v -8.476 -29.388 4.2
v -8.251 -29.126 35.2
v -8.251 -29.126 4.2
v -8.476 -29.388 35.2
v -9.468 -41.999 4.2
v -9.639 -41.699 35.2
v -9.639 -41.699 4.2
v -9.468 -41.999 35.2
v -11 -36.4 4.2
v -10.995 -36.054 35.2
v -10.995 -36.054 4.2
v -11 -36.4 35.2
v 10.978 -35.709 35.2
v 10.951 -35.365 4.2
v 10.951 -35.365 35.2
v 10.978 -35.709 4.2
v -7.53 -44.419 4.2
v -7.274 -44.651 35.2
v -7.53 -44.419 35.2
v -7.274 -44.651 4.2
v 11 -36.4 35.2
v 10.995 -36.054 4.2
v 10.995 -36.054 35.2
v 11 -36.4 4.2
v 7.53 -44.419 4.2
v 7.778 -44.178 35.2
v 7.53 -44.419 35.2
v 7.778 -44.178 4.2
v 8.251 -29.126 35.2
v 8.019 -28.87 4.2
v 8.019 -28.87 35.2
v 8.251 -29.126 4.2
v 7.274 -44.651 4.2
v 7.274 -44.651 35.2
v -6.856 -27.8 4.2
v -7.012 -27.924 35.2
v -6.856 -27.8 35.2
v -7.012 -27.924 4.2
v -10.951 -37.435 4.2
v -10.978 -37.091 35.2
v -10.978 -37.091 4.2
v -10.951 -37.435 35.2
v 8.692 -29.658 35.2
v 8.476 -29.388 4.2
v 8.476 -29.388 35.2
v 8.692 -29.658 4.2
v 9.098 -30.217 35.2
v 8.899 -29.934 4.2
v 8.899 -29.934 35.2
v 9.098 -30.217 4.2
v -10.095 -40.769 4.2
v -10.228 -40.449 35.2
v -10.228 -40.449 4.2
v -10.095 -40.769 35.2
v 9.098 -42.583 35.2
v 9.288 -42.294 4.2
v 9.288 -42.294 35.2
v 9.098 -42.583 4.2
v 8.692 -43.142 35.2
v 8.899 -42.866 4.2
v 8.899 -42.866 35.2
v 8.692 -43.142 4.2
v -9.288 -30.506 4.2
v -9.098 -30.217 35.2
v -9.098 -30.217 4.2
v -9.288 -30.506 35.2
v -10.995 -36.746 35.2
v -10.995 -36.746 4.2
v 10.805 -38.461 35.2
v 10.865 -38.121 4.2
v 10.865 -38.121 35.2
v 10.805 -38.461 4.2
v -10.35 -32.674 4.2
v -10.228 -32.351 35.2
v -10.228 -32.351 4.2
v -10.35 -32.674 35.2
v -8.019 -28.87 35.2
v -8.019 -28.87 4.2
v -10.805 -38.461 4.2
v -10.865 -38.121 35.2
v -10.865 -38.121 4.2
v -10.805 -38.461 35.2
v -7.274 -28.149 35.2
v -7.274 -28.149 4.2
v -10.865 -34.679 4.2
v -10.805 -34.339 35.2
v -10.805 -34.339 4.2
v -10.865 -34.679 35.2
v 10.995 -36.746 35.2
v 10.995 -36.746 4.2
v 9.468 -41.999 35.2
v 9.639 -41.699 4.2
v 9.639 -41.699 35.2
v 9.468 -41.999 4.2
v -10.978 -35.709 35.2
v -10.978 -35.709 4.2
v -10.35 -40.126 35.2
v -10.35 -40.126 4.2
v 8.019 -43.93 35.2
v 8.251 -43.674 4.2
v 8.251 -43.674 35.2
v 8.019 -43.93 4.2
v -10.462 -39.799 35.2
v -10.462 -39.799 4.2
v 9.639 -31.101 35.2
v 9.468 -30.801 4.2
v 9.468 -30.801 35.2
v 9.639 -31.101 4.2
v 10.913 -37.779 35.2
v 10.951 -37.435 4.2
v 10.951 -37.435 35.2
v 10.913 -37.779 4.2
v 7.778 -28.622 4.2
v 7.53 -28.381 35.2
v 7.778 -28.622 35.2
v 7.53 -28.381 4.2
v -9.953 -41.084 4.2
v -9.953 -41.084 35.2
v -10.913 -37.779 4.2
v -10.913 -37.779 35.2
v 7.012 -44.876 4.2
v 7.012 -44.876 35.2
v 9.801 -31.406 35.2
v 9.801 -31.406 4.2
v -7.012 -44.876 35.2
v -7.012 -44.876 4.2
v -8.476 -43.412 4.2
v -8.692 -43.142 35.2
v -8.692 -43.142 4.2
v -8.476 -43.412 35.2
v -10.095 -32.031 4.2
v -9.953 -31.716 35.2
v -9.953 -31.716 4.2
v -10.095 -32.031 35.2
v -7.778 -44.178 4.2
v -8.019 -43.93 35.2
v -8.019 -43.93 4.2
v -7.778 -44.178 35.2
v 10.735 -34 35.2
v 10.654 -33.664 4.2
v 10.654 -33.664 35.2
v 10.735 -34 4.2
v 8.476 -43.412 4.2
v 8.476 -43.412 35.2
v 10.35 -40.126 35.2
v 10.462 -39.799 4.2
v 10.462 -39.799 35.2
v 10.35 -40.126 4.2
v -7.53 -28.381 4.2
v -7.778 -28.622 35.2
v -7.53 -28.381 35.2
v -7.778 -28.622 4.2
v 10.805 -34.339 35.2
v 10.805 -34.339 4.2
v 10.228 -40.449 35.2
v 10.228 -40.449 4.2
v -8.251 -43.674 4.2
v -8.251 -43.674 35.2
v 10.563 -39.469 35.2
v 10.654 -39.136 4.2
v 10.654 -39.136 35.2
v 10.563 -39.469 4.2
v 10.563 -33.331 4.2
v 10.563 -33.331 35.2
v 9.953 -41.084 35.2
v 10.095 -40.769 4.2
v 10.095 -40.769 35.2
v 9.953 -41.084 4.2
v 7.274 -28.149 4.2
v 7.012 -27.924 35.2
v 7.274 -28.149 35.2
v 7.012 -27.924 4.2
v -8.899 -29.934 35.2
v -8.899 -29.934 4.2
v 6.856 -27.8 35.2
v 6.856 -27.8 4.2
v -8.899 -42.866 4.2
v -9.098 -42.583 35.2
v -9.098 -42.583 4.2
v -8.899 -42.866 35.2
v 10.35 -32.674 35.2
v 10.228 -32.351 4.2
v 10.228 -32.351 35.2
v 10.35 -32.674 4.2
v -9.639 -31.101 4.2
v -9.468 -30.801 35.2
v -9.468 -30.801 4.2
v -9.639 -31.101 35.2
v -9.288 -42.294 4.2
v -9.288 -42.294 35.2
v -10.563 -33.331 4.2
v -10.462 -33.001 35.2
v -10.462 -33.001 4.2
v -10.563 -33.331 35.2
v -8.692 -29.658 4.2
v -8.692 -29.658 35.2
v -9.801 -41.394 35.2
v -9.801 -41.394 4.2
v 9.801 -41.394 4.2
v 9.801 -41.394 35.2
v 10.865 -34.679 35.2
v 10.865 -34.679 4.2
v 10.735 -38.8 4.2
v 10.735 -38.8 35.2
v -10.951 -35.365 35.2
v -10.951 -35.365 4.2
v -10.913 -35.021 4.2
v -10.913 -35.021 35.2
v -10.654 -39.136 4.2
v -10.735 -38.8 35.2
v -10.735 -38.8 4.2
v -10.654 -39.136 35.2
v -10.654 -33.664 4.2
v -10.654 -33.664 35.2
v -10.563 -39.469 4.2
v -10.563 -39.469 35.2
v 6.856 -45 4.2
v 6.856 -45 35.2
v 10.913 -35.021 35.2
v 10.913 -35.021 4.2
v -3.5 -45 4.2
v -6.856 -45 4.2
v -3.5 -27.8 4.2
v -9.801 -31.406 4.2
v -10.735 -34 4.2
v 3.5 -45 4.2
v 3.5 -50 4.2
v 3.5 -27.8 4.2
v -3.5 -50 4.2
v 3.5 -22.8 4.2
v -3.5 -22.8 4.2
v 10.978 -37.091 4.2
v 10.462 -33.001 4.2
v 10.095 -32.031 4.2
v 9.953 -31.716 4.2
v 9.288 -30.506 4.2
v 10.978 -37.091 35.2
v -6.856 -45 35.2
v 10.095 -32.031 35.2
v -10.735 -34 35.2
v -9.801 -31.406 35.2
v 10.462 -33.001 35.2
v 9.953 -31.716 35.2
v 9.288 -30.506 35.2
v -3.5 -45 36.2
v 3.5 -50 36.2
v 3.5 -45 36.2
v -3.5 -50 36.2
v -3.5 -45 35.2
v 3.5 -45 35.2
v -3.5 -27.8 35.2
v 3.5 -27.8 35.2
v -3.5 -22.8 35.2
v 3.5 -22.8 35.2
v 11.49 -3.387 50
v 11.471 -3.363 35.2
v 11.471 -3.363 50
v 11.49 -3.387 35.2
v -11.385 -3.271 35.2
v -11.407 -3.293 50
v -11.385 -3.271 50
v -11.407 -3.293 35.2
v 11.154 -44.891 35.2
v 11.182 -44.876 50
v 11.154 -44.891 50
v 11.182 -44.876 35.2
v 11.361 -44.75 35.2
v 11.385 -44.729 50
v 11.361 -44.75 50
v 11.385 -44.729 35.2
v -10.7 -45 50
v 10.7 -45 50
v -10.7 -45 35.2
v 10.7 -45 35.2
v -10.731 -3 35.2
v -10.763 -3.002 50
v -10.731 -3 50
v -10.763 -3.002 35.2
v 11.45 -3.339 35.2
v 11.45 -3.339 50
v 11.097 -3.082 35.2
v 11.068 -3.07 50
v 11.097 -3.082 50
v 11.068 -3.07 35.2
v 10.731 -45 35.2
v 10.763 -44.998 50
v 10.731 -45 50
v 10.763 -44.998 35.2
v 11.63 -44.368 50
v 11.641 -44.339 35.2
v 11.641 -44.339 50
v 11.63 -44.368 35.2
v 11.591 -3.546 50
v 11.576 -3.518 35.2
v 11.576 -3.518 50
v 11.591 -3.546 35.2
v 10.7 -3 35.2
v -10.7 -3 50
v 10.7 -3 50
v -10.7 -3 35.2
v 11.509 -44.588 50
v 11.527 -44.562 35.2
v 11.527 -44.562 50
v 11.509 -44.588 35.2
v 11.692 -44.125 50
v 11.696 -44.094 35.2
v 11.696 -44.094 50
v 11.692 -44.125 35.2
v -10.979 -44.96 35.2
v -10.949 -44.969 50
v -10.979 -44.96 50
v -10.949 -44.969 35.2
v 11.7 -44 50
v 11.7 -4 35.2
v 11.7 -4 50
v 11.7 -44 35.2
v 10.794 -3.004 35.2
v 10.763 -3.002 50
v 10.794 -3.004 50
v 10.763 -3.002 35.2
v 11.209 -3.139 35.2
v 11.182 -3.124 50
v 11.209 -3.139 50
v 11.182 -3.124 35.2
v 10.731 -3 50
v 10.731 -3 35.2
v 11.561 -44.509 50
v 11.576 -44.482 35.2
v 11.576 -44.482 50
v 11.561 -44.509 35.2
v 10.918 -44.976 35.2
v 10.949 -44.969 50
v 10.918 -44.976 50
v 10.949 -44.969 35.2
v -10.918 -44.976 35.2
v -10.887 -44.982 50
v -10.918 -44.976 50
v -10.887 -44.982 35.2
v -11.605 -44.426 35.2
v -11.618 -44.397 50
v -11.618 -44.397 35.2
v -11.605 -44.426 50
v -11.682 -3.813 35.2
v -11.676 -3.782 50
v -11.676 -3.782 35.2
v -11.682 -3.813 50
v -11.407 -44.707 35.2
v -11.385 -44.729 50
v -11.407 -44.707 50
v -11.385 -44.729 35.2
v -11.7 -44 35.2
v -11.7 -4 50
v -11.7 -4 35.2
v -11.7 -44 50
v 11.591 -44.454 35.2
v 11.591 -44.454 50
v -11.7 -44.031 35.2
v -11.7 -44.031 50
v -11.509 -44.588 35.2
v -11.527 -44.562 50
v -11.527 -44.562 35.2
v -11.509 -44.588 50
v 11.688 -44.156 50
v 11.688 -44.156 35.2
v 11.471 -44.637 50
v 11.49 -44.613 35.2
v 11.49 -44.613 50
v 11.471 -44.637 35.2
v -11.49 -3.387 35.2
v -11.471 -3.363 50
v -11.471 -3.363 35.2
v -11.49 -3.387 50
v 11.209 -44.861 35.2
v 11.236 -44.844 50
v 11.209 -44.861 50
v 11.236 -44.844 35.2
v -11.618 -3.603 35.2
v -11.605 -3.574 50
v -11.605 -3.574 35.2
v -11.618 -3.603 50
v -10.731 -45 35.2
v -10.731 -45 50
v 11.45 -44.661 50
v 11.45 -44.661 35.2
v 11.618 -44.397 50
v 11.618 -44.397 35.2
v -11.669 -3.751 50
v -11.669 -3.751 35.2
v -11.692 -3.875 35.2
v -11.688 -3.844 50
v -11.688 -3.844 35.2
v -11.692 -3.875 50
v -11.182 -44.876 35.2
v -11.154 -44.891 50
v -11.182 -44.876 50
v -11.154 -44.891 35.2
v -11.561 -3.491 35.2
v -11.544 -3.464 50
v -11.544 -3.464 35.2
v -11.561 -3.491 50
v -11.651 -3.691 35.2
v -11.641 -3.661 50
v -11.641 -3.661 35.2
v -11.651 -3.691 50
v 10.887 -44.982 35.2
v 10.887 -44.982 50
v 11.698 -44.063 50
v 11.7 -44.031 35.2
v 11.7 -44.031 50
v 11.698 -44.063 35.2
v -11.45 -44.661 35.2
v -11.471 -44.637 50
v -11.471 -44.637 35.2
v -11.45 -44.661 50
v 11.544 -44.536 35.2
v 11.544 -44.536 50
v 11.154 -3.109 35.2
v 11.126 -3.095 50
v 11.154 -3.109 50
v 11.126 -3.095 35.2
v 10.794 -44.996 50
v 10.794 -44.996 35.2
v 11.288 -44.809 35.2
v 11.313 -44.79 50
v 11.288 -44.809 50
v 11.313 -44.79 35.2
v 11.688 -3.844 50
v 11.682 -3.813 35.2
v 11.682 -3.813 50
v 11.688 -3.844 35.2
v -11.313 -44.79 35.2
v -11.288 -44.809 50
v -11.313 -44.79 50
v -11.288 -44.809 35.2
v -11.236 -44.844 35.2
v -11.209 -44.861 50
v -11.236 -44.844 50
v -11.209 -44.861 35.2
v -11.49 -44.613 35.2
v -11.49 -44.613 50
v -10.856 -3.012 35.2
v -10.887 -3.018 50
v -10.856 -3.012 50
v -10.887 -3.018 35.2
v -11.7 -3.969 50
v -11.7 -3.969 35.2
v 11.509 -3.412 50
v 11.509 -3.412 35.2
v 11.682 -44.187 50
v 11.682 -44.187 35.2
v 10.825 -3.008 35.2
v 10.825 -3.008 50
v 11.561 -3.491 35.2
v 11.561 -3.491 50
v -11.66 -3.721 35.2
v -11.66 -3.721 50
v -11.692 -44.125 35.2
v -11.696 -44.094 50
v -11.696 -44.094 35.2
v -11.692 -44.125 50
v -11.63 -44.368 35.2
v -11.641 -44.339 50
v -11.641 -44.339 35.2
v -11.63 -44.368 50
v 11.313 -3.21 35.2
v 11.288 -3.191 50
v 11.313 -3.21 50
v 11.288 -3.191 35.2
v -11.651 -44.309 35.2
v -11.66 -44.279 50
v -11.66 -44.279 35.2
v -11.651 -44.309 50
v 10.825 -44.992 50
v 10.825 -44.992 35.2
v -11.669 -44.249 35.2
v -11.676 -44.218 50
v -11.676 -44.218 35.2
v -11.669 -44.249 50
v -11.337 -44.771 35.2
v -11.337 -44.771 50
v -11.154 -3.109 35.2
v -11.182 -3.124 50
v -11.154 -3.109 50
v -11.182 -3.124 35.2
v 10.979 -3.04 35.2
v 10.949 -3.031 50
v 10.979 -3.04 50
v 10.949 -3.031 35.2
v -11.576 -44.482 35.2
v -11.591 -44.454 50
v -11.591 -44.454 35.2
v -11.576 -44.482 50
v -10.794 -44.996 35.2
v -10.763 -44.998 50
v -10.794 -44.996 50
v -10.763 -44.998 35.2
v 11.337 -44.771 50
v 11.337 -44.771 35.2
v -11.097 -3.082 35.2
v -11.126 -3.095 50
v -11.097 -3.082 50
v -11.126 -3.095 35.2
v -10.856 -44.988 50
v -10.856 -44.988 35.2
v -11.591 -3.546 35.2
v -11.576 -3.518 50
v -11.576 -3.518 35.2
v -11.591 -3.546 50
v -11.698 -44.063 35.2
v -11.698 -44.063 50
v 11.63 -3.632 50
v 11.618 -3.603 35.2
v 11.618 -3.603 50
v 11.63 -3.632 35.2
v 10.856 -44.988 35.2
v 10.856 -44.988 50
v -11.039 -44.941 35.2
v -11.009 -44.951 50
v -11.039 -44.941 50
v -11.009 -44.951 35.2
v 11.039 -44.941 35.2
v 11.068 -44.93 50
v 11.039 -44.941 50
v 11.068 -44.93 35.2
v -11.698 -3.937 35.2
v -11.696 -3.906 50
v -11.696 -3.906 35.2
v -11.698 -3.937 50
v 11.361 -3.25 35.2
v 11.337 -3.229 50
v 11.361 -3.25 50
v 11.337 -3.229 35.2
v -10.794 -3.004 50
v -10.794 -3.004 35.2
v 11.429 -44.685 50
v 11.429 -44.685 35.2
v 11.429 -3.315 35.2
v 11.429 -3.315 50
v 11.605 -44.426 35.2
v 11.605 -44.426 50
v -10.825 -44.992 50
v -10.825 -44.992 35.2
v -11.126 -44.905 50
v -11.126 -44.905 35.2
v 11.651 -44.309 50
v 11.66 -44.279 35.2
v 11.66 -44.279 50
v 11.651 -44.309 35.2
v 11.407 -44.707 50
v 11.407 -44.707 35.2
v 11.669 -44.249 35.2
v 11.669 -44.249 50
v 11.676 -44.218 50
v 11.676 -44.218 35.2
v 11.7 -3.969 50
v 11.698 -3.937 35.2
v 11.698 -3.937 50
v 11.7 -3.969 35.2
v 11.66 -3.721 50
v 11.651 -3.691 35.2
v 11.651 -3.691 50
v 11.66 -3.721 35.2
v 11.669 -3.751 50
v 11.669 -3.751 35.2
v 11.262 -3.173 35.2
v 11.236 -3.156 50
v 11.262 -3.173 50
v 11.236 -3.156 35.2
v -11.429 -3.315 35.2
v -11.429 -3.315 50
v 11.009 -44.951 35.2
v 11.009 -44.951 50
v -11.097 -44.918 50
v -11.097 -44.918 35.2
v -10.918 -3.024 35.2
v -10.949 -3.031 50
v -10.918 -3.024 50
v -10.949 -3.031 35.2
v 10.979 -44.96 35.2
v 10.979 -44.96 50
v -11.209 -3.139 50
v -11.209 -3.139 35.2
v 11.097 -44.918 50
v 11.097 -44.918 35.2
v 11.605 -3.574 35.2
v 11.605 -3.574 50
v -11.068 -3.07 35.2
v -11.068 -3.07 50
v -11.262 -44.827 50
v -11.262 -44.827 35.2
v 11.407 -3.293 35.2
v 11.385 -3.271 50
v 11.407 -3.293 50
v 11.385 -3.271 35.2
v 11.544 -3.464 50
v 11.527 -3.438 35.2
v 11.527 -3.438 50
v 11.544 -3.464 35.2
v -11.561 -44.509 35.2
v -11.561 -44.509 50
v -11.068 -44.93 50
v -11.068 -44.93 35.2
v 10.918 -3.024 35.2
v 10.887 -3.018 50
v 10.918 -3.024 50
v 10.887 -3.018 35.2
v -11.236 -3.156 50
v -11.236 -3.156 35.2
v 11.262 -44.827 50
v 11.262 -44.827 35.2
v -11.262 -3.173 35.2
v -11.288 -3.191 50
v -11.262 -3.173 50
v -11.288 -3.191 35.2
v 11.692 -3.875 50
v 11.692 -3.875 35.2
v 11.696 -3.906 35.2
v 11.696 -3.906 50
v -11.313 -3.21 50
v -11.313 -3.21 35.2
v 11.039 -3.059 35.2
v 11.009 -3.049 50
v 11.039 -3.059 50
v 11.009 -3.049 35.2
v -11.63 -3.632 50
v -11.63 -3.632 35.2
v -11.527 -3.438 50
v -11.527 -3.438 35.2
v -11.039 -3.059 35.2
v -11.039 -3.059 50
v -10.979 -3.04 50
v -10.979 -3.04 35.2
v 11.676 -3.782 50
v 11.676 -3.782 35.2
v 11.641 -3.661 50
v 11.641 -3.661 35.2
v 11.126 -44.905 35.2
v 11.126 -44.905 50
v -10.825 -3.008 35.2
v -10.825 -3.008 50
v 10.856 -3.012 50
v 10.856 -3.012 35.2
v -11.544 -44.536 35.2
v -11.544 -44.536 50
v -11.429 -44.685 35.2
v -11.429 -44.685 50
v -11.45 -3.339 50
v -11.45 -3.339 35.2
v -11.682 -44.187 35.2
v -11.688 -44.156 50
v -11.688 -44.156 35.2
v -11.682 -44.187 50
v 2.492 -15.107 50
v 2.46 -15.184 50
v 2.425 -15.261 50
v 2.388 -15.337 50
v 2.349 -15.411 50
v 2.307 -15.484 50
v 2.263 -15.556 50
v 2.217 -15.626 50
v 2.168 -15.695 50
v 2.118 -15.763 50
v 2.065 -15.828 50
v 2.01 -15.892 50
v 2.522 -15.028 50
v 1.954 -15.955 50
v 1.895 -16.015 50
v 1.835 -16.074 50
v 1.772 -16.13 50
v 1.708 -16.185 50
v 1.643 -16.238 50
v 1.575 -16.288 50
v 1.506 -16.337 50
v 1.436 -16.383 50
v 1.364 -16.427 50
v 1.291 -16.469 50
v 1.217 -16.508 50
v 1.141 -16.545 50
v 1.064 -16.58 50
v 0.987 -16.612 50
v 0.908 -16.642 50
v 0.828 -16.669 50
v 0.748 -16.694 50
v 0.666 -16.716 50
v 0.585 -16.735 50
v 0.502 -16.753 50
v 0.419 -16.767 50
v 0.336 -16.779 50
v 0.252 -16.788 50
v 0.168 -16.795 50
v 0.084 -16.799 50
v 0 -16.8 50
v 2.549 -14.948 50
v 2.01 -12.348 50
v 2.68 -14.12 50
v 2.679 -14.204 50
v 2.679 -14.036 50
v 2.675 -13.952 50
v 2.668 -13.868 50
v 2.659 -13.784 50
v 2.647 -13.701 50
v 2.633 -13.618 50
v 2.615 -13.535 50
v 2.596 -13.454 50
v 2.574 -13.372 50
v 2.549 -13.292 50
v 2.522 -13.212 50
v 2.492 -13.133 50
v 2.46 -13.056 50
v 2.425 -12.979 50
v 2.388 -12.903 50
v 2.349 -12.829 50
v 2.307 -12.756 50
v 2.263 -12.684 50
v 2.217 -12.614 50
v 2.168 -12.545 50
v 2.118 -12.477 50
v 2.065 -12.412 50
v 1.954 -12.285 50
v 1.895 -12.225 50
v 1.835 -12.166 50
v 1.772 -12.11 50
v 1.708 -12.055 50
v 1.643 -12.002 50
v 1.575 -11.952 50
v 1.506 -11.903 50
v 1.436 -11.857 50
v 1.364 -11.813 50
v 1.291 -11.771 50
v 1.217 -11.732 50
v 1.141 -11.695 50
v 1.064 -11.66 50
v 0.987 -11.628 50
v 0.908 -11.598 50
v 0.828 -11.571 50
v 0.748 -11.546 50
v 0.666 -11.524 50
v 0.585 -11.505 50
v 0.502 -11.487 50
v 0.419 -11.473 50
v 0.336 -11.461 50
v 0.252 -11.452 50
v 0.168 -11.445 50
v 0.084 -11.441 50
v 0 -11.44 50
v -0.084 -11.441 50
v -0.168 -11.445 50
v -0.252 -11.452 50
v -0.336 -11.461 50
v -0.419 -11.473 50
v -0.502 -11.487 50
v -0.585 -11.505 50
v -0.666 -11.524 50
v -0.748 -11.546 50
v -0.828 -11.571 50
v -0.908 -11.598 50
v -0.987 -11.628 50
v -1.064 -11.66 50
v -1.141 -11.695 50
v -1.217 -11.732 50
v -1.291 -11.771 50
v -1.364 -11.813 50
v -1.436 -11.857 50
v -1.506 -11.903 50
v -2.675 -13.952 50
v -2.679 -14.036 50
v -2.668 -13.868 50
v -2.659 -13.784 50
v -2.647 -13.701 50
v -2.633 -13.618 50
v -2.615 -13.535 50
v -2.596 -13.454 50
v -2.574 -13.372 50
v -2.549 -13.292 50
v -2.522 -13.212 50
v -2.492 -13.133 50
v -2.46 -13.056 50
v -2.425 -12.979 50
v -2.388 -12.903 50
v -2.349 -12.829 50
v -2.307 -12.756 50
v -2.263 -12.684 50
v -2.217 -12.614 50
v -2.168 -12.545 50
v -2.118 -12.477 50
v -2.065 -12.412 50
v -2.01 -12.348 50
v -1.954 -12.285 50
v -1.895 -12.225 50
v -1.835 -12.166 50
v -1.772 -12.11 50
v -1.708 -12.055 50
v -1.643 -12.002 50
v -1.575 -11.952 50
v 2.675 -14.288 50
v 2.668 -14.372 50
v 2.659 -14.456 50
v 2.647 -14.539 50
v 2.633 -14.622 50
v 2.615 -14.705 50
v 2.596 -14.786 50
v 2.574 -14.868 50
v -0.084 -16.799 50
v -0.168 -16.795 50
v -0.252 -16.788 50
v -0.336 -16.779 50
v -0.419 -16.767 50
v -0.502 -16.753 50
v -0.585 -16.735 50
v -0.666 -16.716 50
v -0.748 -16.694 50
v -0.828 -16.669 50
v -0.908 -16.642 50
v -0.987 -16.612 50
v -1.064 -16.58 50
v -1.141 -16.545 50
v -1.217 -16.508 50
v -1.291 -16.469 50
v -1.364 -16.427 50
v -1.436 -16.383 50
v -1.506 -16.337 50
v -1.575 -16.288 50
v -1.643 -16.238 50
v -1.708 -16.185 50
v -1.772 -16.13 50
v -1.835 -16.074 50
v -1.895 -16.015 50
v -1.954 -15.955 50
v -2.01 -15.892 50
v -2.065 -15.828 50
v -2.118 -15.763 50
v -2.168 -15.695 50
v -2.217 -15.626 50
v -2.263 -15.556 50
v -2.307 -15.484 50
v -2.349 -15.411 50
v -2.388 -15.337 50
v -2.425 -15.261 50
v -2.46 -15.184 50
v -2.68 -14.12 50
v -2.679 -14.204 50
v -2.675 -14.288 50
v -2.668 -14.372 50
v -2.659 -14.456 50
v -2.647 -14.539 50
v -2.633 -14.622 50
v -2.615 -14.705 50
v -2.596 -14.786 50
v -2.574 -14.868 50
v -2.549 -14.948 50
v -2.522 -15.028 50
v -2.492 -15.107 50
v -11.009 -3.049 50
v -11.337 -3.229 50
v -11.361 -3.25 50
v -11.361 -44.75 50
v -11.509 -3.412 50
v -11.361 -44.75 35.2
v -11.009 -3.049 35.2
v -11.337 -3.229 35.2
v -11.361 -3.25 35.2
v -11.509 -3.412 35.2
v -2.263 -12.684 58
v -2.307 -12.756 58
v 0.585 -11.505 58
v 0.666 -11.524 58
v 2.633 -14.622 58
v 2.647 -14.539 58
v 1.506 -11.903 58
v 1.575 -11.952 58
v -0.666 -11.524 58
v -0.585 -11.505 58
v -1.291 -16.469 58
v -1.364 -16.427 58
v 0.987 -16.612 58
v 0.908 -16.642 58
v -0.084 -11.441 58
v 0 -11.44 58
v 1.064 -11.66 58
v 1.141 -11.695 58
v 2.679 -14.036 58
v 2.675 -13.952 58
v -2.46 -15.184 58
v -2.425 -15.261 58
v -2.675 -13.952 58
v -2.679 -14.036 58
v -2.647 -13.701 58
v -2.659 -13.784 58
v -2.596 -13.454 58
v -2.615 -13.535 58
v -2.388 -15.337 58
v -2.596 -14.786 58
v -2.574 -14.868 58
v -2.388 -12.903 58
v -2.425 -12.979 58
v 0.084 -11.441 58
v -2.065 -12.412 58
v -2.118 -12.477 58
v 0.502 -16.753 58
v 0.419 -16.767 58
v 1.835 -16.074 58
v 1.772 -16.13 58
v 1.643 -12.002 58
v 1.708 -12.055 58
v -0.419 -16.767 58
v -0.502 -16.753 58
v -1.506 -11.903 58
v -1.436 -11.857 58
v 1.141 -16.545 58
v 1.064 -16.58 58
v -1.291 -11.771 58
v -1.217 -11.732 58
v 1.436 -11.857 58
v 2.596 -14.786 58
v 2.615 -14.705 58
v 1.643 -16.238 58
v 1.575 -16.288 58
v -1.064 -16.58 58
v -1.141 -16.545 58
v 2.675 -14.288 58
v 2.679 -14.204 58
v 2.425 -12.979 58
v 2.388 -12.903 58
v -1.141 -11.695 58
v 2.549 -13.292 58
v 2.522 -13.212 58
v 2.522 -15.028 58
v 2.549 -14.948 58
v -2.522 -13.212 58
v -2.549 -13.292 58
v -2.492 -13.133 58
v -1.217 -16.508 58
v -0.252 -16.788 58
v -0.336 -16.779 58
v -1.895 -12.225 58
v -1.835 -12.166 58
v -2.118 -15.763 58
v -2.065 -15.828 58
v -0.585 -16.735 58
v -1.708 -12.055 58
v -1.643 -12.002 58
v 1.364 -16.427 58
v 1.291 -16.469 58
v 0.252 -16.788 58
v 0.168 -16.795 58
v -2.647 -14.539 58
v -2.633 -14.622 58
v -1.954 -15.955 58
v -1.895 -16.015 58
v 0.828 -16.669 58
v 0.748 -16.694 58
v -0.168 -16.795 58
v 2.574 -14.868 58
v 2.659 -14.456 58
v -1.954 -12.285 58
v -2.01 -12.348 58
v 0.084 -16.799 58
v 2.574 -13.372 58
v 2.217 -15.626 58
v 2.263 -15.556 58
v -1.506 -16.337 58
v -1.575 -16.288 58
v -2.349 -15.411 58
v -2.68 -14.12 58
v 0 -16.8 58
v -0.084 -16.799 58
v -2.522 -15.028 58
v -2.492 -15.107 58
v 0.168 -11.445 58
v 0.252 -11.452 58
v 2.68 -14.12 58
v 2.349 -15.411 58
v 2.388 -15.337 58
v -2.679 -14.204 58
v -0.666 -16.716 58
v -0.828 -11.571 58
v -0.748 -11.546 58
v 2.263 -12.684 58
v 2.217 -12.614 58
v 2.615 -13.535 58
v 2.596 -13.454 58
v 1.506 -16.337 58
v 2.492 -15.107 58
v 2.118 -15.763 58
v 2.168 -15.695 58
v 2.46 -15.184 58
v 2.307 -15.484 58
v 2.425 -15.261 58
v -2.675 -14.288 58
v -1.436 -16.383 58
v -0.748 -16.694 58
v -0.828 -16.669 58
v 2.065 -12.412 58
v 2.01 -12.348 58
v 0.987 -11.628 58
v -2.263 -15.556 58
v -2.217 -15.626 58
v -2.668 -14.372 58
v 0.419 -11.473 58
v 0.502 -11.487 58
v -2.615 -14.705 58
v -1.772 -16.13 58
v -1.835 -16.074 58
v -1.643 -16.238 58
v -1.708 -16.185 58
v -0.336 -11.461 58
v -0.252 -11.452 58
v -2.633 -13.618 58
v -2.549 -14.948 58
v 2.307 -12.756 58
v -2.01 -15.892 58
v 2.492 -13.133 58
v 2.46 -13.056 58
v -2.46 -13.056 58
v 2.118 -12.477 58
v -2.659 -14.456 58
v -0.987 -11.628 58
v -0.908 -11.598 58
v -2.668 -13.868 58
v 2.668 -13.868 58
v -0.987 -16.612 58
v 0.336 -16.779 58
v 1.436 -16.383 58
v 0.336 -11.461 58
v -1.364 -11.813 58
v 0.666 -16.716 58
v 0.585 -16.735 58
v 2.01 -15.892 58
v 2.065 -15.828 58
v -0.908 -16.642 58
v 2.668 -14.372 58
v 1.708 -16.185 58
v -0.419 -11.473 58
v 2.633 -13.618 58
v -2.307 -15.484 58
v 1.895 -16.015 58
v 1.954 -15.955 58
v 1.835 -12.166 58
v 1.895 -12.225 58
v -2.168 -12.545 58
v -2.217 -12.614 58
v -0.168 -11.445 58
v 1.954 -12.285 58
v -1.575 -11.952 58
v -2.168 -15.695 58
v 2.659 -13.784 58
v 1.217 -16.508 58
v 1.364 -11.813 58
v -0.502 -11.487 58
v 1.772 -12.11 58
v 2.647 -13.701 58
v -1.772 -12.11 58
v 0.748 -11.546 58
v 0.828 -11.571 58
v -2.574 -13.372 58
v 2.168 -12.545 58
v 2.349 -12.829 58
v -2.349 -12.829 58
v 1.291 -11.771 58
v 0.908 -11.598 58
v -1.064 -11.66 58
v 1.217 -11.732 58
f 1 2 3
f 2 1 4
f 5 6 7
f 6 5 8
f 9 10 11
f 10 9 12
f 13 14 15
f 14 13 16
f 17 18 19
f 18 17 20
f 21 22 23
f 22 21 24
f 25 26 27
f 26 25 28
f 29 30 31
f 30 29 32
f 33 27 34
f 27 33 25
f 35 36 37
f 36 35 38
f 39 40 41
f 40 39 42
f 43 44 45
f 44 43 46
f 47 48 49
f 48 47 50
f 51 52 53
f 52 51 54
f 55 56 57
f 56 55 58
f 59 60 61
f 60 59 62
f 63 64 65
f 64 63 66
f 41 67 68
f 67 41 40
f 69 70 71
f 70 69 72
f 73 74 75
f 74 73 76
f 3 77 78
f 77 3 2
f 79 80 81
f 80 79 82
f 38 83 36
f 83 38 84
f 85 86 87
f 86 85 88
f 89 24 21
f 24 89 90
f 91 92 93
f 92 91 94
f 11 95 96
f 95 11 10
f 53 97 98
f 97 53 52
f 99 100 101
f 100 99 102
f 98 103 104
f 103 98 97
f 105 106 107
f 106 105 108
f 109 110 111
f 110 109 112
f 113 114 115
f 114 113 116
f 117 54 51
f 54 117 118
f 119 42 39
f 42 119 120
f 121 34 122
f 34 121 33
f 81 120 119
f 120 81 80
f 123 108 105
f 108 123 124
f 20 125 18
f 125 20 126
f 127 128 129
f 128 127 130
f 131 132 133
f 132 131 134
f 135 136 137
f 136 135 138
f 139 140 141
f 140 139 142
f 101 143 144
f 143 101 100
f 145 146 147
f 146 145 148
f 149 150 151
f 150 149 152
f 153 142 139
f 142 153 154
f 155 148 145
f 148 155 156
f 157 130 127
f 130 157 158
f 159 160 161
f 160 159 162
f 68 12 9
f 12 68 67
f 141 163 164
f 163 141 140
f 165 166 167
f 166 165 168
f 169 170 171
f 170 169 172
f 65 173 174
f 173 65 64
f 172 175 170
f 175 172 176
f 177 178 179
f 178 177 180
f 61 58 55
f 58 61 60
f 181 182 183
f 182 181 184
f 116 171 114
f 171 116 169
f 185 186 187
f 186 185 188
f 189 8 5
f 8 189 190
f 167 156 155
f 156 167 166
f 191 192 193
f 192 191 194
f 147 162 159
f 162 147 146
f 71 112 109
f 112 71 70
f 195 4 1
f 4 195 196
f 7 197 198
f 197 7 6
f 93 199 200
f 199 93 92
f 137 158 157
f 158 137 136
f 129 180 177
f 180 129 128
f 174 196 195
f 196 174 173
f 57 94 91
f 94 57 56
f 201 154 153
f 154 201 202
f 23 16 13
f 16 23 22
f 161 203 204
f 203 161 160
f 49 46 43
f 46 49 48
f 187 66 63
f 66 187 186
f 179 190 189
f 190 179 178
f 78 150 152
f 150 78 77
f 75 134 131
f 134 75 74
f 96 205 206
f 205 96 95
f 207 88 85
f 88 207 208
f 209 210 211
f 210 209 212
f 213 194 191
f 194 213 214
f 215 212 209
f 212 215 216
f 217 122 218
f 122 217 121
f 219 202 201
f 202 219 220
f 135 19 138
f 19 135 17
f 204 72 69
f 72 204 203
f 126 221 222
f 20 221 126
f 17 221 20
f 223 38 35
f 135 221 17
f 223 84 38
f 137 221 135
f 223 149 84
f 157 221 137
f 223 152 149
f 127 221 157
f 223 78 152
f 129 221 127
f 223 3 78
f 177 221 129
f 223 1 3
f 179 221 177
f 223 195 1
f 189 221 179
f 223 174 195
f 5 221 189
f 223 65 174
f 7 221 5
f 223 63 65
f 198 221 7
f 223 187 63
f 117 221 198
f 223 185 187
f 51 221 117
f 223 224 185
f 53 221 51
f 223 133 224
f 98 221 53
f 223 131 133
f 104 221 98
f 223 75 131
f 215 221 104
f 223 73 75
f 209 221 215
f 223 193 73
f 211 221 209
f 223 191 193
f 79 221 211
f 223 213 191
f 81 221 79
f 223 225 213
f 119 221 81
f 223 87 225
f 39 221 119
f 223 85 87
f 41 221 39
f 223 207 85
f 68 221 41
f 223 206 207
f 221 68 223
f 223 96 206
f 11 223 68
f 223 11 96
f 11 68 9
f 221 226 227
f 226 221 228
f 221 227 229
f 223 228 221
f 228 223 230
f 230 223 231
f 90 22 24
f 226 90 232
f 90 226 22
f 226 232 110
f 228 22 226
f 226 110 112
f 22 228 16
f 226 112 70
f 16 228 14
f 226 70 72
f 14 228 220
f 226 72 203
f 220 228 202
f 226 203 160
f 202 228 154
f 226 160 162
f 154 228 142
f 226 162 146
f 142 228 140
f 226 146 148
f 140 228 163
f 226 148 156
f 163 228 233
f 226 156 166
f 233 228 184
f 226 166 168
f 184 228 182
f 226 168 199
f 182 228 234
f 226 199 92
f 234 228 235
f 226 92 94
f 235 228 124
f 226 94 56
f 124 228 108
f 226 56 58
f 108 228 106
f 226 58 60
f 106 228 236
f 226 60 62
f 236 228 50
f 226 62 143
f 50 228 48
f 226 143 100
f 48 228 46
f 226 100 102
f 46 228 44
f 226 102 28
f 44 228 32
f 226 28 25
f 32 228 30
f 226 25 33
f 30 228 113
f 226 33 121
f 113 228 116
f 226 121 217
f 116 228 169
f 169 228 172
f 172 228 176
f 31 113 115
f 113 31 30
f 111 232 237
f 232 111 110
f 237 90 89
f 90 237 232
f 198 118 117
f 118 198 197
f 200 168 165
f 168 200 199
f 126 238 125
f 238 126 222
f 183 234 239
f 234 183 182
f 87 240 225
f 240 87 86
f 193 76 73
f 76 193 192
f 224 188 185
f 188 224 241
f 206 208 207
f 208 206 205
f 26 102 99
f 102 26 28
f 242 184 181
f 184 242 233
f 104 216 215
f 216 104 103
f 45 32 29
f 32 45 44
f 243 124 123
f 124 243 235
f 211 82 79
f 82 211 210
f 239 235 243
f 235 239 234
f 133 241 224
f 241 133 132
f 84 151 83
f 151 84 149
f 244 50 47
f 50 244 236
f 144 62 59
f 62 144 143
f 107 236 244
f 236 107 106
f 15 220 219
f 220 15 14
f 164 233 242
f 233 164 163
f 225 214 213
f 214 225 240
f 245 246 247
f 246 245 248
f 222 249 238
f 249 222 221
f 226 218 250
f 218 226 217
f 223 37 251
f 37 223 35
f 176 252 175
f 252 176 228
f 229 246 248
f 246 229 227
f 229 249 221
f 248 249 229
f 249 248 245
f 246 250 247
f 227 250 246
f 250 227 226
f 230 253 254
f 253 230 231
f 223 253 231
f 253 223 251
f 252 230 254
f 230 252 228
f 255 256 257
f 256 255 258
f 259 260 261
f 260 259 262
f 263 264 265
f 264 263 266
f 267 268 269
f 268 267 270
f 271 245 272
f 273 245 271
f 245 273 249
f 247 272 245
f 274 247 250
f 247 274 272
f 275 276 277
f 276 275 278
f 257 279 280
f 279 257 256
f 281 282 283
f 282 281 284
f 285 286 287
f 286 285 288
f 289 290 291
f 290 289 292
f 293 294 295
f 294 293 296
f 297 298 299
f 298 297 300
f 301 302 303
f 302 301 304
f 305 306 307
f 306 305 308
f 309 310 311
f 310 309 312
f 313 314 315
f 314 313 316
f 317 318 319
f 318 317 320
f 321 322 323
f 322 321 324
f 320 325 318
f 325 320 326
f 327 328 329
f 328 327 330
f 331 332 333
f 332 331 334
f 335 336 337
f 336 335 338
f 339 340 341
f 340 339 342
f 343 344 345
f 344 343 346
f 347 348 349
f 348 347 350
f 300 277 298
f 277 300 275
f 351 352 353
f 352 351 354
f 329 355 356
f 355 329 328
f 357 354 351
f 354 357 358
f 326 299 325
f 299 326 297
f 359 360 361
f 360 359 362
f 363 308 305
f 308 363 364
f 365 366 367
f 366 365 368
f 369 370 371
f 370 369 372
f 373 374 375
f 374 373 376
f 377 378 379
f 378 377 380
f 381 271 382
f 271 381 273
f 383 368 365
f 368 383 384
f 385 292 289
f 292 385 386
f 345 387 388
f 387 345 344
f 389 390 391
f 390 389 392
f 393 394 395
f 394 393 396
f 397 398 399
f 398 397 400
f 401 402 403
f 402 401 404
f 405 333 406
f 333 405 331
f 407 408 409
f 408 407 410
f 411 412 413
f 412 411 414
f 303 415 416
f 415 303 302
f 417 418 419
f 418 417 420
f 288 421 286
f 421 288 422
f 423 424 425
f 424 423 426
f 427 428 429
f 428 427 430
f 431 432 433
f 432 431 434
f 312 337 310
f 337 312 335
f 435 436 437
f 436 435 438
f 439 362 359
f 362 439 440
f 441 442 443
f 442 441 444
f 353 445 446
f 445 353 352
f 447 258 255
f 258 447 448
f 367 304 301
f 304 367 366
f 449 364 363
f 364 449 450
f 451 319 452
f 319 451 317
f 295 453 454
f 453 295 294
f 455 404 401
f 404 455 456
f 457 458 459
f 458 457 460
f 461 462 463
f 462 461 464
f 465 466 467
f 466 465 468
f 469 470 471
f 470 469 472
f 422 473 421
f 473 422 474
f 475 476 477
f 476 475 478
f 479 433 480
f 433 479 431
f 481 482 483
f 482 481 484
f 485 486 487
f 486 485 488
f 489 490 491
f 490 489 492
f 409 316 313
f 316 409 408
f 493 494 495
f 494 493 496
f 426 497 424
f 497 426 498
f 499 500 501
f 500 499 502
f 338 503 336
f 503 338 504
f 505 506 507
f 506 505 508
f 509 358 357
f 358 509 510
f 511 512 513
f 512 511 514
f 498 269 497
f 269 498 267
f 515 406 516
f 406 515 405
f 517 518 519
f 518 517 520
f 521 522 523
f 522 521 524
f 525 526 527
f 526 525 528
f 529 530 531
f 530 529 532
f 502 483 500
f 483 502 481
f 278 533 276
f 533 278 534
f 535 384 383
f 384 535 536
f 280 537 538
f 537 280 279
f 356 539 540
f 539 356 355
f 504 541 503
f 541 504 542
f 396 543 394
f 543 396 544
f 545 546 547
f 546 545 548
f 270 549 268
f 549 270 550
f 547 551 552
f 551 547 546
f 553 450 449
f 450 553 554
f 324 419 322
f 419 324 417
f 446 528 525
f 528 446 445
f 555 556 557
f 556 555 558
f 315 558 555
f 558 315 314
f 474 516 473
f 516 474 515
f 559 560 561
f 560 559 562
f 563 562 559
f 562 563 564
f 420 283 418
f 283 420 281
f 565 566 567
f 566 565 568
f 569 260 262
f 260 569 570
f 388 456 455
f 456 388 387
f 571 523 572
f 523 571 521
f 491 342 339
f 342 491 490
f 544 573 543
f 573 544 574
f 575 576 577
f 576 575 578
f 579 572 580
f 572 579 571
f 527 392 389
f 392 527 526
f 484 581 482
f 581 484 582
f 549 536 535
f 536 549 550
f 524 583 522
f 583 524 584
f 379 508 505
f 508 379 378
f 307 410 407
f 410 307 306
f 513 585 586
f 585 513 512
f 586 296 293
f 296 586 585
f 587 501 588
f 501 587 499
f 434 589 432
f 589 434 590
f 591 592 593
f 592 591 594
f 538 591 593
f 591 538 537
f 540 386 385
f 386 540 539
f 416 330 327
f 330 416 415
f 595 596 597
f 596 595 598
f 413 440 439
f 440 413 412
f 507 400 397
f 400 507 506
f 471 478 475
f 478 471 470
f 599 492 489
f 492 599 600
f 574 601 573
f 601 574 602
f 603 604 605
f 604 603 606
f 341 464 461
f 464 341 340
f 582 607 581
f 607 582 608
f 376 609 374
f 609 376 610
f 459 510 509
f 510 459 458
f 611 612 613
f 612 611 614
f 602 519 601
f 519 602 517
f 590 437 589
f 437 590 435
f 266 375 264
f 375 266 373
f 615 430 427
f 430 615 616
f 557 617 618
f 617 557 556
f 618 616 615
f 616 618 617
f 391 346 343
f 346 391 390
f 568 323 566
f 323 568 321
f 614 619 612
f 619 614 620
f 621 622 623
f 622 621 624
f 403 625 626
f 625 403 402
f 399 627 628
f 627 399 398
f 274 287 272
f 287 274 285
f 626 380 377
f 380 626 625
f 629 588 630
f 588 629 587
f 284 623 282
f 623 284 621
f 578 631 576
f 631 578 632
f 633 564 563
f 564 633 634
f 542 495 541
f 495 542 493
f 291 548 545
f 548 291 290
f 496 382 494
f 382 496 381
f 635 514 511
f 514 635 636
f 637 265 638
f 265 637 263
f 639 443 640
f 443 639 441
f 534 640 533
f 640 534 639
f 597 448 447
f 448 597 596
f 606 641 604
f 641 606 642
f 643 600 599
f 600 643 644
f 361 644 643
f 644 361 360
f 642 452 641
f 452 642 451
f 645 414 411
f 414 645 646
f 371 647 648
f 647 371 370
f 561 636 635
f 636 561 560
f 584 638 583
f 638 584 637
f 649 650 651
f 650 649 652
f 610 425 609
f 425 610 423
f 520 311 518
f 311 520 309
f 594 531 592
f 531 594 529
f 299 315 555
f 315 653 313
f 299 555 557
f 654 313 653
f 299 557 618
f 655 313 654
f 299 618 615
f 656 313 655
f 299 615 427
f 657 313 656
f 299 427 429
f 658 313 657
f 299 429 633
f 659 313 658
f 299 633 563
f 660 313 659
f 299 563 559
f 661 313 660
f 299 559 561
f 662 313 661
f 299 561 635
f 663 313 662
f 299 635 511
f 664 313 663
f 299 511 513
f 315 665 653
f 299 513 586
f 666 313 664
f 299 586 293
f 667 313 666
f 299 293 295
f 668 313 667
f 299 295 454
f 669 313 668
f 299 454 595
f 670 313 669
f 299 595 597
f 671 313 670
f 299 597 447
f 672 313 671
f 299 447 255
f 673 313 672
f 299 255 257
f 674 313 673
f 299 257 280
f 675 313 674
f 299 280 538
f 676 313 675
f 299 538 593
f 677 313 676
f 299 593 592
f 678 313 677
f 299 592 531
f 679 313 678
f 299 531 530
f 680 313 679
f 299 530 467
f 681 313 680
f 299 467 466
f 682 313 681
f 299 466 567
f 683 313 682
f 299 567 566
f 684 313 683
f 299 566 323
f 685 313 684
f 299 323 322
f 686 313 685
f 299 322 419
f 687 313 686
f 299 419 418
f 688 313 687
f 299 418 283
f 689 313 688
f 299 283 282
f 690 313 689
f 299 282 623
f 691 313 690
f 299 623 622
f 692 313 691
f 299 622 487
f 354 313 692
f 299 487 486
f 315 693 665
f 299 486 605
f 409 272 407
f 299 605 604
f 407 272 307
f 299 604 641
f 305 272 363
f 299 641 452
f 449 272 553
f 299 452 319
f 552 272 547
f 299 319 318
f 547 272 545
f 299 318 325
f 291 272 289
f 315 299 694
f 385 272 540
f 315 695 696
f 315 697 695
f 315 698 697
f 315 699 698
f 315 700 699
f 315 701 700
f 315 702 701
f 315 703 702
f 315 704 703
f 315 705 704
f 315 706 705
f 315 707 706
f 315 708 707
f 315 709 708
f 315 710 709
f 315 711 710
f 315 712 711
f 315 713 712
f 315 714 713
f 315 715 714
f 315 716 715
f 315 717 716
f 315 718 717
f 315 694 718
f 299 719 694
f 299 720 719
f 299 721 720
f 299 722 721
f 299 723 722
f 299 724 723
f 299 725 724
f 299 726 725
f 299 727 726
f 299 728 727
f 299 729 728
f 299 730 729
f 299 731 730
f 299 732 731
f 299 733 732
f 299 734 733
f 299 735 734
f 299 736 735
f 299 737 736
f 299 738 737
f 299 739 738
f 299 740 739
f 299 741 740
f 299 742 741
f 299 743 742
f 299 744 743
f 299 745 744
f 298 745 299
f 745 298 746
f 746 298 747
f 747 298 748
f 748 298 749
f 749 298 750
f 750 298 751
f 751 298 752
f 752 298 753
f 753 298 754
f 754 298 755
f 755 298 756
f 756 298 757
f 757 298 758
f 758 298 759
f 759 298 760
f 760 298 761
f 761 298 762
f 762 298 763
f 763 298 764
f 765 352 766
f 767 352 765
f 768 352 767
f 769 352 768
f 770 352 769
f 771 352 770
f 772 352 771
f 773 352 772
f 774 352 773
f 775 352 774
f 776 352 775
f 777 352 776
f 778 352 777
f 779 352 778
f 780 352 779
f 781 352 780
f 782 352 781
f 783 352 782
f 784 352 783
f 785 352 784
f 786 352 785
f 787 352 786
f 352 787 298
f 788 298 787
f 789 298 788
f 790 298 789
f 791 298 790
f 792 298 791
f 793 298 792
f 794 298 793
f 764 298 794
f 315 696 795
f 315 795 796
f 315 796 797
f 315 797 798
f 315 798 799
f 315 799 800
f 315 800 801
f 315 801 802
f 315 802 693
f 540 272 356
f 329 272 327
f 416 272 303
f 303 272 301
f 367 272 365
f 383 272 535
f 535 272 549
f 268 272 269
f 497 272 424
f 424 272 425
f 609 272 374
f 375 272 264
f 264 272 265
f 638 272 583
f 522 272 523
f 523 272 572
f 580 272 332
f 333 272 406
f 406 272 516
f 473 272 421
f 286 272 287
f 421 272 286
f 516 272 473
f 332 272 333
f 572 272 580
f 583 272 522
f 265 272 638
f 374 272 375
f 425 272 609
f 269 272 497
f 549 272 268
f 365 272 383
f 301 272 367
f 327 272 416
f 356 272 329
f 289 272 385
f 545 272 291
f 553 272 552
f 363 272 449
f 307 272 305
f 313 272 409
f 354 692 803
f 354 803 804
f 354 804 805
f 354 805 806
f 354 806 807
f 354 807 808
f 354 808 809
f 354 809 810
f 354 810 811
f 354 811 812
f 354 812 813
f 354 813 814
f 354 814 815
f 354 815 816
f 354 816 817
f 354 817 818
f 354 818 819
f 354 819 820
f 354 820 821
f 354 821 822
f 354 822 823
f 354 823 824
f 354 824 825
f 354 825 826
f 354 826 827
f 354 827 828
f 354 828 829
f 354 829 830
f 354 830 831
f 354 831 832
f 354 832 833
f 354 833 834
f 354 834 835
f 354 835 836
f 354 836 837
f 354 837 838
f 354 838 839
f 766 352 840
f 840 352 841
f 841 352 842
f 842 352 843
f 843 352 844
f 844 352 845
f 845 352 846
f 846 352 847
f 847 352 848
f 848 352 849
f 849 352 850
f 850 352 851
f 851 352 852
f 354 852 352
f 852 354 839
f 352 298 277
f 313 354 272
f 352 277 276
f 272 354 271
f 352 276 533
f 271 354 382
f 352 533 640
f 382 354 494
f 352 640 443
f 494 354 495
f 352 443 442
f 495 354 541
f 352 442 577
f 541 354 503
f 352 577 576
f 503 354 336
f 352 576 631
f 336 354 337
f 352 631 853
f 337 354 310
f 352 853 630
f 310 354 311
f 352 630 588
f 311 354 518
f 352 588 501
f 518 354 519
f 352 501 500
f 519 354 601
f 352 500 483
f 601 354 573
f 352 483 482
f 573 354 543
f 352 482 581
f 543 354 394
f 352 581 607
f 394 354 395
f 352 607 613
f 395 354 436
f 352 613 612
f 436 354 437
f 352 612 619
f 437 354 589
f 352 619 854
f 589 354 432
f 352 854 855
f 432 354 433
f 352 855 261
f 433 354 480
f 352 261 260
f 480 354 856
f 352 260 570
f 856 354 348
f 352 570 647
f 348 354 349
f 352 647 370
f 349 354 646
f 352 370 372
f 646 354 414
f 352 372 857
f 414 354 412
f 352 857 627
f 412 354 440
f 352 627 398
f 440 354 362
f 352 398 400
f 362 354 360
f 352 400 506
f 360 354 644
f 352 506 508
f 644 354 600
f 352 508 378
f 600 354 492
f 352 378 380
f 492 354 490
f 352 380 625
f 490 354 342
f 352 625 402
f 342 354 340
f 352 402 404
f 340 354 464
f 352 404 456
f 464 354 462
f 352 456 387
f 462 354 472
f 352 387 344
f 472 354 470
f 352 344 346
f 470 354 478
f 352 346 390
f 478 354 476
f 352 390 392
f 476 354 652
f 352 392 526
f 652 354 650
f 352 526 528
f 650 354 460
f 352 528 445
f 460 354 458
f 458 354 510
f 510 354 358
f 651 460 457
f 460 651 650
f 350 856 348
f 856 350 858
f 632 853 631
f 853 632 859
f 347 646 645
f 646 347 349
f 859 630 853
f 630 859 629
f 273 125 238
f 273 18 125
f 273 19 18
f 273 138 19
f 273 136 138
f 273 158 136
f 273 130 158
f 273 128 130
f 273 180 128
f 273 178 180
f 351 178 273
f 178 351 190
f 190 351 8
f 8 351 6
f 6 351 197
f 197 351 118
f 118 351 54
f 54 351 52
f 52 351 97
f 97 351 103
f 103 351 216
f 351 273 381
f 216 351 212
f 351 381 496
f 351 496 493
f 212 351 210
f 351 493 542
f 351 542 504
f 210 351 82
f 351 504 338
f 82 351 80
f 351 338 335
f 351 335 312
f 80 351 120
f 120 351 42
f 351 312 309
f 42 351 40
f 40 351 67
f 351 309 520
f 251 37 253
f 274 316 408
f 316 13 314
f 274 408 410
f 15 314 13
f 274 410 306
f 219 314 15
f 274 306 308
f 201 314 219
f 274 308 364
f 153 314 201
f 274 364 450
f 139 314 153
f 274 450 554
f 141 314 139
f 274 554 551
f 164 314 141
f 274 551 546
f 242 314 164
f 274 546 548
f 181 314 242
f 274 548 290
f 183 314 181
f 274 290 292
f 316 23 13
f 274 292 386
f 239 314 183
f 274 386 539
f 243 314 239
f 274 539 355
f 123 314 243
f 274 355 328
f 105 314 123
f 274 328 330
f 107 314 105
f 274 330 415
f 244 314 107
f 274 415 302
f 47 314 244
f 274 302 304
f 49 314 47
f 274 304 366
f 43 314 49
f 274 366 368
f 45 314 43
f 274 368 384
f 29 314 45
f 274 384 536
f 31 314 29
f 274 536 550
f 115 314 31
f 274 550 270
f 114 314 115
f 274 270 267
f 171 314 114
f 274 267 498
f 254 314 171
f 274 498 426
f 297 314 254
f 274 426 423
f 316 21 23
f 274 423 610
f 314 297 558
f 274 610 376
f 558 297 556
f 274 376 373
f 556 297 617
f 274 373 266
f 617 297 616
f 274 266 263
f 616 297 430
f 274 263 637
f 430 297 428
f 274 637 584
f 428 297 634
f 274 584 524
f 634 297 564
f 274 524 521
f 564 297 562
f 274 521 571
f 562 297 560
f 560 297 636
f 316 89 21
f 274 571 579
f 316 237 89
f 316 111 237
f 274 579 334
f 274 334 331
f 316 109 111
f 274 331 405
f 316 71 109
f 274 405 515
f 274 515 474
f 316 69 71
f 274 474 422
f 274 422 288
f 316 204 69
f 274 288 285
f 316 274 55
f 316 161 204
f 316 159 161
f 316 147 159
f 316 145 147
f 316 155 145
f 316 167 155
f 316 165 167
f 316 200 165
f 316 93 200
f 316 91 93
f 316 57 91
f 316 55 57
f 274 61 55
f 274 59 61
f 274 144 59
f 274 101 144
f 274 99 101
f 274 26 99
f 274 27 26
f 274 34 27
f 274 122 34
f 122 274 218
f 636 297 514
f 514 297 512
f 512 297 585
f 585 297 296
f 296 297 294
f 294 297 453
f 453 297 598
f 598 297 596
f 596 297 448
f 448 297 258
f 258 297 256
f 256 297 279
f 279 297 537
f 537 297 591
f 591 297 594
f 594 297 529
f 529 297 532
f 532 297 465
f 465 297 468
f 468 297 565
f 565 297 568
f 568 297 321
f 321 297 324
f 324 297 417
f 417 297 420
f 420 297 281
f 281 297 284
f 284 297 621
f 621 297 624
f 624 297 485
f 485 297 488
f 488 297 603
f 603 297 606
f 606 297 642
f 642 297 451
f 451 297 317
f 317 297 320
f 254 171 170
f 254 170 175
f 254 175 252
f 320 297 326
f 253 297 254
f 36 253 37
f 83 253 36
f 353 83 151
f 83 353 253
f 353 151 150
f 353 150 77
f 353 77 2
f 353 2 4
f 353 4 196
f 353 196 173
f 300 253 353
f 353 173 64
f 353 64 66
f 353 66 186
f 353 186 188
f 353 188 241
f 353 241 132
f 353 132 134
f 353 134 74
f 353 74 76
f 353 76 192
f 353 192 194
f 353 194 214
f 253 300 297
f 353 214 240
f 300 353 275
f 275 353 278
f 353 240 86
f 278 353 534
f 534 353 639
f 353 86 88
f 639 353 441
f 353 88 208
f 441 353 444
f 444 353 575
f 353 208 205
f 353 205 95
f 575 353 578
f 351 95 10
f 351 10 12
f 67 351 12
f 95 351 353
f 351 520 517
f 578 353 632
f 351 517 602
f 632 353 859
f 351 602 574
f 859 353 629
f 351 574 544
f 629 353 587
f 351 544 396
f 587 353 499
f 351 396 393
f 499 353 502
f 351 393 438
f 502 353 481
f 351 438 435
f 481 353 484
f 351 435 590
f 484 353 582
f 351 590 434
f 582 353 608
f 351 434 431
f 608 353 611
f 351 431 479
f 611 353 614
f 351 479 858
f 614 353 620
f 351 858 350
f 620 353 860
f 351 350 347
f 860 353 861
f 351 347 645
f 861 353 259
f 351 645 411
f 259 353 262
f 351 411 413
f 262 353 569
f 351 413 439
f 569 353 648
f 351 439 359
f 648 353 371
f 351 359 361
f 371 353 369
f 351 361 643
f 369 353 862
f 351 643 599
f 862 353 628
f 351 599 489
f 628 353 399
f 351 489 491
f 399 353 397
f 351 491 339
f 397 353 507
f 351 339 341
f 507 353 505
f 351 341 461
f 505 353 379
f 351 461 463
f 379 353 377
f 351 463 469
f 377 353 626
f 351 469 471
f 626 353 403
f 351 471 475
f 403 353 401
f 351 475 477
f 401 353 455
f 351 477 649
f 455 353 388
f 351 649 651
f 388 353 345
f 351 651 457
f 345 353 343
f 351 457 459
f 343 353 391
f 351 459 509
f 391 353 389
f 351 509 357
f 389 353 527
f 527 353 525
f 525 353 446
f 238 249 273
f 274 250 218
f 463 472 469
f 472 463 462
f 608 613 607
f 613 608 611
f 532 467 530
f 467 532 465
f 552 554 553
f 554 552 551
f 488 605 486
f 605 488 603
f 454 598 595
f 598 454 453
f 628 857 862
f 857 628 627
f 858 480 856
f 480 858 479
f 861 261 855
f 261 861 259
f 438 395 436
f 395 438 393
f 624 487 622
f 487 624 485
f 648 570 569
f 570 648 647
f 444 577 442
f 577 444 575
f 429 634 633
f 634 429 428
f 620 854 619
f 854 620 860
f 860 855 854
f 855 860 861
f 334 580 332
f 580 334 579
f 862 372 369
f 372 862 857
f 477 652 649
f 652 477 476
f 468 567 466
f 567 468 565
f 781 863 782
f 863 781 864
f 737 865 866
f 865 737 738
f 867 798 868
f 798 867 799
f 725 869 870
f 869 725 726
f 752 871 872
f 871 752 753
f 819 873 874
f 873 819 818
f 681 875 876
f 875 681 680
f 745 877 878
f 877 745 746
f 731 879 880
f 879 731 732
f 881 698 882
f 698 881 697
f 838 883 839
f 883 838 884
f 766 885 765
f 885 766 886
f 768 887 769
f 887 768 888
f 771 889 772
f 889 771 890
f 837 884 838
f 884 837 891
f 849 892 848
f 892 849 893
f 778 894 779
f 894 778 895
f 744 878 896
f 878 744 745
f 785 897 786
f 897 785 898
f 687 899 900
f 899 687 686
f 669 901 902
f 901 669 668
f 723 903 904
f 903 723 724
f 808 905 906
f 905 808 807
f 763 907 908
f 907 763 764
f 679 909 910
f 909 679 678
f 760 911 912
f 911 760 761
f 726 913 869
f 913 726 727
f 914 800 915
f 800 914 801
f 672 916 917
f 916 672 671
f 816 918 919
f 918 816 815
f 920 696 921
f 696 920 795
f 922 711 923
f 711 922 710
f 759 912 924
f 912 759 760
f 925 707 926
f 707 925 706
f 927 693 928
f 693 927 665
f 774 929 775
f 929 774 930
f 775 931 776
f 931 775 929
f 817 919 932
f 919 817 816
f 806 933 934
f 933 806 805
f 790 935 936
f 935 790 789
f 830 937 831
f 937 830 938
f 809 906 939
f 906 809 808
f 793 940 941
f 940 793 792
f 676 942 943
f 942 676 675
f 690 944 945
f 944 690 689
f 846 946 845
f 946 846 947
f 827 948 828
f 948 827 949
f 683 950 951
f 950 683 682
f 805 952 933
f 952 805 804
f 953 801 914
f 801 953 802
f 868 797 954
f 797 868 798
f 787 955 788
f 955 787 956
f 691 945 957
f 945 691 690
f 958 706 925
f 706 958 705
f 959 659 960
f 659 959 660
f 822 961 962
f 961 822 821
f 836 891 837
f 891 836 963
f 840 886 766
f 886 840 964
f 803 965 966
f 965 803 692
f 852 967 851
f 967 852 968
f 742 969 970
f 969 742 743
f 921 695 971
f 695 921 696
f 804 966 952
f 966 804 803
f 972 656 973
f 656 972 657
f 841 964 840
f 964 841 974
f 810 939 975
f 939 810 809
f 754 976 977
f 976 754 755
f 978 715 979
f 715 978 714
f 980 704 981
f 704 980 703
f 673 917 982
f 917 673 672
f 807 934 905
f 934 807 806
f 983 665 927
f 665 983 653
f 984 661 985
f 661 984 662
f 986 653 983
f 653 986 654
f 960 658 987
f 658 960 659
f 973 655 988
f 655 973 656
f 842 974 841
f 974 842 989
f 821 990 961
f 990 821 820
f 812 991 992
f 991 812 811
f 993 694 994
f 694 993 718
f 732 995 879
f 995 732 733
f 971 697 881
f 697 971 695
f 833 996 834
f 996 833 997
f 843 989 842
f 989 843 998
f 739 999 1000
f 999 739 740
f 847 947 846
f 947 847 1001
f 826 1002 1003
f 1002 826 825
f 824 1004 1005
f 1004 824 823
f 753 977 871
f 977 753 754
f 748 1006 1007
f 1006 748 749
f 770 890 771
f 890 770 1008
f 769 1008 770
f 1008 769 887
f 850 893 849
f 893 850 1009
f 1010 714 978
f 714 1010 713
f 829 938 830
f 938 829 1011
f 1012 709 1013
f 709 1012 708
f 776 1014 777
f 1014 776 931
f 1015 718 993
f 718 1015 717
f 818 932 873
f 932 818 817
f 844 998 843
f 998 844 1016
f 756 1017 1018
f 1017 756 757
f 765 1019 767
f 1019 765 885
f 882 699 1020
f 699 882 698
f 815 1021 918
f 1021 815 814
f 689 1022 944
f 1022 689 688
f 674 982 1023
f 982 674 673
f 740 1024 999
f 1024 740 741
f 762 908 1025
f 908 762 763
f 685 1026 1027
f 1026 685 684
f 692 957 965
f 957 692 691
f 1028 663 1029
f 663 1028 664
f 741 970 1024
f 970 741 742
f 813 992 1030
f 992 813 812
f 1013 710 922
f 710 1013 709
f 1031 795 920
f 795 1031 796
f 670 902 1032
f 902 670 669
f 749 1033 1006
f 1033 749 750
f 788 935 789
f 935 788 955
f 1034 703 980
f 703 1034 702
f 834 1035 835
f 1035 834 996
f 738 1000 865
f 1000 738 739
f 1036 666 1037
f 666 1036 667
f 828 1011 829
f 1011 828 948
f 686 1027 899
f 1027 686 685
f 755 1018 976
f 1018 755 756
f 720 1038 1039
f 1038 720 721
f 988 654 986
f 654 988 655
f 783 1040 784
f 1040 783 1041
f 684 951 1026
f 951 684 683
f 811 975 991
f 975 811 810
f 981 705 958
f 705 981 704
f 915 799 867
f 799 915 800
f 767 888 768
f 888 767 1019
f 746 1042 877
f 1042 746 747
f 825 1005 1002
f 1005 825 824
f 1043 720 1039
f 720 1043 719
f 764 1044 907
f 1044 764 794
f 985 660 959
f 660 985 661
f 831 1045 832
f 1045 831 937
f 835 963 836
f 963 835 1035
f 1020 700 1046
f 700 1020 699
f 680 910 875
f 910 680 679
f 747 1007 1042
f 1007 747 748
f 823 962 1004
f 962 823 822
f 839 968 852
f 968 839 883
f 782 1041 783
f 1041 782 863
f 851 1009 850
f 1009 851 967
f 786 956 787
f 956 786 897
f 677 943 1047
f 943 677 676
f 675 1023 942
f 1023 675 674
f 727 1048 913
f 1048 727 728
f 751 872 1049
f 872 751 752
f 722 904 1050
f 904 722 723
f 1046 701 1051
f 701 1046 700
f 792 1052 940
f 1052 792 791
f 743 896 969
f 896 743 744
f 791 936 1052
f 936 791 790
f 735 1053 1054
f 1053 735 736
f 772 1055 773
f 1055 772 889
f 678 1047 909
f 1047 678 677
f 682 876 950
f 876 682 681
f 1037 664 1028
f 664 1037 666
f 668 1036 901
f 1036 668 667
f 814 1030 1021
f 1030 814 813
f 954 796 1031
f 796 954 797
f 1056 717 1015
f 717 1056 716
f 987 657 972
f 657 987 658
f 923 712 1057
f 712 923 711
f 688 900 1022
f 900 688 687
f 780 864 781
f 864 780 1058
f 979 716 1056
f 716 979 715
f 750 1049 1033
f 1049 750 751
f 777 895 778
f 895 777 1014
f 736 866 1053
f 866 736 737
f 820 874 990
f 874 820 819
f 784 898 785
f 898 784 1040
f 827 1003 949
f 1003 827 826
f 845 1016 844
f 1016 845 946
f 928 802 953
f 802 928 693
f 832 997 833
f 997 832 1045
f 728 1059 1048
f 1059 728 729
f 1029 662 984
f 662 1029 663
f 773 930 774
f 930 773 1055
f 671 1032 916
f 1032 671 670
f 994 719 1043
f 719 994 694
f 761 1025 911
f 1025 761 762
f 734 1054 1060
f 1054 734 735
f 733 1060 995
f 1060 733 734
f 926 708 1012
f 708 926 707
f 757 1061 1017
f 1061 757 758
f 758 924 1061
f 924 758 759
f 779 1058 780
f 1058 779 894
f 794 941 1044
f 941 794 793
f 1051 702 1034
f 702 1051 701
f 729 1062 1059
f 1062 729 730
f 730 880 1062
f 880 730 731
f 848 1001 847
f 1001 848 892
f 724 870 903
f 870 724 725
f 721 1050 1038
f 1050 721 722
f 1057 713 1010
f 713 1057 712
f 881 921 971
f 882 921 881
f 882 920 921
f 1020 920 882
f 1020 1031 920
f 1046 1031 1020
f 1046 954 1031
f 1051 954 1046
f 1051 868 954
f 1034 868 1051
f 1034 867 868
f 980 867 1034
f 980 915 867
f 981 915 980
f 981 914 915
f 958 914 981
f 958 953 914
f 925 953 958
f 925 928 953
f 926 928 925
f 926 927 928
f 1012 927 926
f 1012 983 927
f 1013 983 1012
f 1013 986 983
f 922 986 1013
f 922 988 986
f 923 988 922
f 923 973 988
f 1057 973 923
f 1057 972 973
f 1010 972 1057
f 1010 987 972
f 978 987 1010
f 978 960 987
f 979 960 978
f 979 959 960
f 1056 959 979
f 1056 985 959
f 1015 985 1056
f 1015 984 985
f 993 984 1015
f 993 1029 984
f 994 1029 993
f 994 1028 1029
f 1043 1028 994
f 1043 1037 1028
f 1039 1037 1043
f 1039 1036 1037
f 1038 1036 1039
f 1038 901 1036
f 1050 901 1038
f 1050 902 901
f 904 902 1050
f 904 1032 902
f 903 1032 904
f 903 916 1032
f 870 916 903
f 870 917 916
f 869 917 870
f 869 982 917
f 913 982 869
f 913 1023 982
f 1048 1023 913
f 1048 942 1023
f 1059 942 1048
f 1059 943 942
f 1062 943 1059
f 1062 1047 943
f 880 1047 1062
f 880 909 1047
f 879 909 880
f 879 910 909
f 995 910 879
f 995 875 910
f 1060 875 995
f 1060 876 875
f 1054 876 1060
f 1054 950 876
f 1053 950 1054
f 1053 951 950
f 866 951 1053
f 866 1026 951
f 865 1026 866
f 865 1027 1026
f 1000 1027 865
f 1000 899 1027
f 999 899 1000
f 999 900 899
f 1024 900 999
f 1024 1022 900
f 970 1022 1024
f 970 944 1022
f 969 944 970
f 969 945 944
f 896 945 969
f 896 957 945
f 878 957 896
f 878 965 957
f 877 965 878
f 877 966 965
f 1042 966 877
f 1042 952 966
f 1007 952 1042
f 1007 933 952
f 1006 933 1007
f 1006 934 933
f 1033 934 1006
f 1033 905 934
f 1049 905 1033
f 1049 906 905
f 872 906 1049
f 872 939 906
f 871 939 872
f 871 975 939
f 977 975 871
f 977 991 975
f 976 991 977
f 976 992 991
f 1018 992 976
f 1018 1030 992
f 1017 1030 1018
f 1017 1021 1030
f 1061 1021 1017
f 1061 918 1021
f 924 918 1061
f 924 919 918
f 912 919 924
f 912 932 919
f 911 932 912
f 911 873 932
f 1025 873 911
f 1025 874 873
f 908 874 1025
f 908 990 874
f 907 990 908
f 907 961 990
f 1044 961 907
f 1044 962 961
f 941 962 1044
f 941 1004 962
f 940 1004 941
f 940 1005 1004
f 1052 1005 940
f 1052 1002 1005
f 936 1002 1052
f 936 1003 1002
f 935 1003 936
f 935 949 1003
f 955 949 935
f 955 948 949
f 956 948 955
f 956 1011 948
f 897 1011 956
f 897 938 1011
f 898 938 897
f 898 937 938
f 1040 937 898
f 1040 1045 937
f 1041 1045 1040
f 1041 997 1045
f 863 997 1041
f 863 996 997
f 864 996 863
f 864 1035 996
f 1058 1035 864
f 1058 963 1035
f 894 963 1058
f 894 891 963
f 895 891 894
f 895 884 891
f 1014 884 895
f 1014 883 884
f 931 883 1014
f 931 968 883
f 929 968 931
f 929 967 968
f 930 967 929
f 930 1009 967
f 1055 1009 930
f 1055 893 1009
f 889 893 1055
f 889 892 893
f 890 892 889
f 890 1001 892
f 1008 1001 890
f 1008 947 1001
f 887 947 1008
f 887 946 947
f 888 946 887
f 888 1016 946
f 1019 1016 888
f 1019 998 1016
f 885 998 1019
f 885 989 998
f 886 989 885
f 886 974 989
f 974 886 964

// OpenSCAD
// file: motor.scad
module motor() {
    $fn=200;
    union()
    {
        minkowski()
        {
            translate([0, 0, 13.8/2]) cube([40, 21.4, 13.8], center=true);
            cylinder(h=1,r=1);
        }
        translate([12.4, 0, 0])
            union()
            {
                difference()
                {
                    translate([0, 0, 13.8+16]) cylinder(h=32, d=22, center=true);
                    translate([17.2/2 + 11, 0, 13.8+16 - 0.05]) cube([22,22,33], center=true);
                    translate([-17.2/2 - 11, 0, 13.8+16 - 0.05]) cube([22,22,33], center=true);
                };
                translate([11.1, 0, 13.8+16]) cube([5,7,32], center=true);
                translate([-11.1, 0, 13.8+16]) cube([5,7,32], center=true);
            };
        translate([-21 +13.8 - (5.36/2), 0, -4])
            color([.60,.60,.60]) cylinder(h=8, d=5.36, center=true);
    }
}
// main file
use <motor.scad>
    translate([0,-24,50])
        rotate([180,0,-90]) motor();
